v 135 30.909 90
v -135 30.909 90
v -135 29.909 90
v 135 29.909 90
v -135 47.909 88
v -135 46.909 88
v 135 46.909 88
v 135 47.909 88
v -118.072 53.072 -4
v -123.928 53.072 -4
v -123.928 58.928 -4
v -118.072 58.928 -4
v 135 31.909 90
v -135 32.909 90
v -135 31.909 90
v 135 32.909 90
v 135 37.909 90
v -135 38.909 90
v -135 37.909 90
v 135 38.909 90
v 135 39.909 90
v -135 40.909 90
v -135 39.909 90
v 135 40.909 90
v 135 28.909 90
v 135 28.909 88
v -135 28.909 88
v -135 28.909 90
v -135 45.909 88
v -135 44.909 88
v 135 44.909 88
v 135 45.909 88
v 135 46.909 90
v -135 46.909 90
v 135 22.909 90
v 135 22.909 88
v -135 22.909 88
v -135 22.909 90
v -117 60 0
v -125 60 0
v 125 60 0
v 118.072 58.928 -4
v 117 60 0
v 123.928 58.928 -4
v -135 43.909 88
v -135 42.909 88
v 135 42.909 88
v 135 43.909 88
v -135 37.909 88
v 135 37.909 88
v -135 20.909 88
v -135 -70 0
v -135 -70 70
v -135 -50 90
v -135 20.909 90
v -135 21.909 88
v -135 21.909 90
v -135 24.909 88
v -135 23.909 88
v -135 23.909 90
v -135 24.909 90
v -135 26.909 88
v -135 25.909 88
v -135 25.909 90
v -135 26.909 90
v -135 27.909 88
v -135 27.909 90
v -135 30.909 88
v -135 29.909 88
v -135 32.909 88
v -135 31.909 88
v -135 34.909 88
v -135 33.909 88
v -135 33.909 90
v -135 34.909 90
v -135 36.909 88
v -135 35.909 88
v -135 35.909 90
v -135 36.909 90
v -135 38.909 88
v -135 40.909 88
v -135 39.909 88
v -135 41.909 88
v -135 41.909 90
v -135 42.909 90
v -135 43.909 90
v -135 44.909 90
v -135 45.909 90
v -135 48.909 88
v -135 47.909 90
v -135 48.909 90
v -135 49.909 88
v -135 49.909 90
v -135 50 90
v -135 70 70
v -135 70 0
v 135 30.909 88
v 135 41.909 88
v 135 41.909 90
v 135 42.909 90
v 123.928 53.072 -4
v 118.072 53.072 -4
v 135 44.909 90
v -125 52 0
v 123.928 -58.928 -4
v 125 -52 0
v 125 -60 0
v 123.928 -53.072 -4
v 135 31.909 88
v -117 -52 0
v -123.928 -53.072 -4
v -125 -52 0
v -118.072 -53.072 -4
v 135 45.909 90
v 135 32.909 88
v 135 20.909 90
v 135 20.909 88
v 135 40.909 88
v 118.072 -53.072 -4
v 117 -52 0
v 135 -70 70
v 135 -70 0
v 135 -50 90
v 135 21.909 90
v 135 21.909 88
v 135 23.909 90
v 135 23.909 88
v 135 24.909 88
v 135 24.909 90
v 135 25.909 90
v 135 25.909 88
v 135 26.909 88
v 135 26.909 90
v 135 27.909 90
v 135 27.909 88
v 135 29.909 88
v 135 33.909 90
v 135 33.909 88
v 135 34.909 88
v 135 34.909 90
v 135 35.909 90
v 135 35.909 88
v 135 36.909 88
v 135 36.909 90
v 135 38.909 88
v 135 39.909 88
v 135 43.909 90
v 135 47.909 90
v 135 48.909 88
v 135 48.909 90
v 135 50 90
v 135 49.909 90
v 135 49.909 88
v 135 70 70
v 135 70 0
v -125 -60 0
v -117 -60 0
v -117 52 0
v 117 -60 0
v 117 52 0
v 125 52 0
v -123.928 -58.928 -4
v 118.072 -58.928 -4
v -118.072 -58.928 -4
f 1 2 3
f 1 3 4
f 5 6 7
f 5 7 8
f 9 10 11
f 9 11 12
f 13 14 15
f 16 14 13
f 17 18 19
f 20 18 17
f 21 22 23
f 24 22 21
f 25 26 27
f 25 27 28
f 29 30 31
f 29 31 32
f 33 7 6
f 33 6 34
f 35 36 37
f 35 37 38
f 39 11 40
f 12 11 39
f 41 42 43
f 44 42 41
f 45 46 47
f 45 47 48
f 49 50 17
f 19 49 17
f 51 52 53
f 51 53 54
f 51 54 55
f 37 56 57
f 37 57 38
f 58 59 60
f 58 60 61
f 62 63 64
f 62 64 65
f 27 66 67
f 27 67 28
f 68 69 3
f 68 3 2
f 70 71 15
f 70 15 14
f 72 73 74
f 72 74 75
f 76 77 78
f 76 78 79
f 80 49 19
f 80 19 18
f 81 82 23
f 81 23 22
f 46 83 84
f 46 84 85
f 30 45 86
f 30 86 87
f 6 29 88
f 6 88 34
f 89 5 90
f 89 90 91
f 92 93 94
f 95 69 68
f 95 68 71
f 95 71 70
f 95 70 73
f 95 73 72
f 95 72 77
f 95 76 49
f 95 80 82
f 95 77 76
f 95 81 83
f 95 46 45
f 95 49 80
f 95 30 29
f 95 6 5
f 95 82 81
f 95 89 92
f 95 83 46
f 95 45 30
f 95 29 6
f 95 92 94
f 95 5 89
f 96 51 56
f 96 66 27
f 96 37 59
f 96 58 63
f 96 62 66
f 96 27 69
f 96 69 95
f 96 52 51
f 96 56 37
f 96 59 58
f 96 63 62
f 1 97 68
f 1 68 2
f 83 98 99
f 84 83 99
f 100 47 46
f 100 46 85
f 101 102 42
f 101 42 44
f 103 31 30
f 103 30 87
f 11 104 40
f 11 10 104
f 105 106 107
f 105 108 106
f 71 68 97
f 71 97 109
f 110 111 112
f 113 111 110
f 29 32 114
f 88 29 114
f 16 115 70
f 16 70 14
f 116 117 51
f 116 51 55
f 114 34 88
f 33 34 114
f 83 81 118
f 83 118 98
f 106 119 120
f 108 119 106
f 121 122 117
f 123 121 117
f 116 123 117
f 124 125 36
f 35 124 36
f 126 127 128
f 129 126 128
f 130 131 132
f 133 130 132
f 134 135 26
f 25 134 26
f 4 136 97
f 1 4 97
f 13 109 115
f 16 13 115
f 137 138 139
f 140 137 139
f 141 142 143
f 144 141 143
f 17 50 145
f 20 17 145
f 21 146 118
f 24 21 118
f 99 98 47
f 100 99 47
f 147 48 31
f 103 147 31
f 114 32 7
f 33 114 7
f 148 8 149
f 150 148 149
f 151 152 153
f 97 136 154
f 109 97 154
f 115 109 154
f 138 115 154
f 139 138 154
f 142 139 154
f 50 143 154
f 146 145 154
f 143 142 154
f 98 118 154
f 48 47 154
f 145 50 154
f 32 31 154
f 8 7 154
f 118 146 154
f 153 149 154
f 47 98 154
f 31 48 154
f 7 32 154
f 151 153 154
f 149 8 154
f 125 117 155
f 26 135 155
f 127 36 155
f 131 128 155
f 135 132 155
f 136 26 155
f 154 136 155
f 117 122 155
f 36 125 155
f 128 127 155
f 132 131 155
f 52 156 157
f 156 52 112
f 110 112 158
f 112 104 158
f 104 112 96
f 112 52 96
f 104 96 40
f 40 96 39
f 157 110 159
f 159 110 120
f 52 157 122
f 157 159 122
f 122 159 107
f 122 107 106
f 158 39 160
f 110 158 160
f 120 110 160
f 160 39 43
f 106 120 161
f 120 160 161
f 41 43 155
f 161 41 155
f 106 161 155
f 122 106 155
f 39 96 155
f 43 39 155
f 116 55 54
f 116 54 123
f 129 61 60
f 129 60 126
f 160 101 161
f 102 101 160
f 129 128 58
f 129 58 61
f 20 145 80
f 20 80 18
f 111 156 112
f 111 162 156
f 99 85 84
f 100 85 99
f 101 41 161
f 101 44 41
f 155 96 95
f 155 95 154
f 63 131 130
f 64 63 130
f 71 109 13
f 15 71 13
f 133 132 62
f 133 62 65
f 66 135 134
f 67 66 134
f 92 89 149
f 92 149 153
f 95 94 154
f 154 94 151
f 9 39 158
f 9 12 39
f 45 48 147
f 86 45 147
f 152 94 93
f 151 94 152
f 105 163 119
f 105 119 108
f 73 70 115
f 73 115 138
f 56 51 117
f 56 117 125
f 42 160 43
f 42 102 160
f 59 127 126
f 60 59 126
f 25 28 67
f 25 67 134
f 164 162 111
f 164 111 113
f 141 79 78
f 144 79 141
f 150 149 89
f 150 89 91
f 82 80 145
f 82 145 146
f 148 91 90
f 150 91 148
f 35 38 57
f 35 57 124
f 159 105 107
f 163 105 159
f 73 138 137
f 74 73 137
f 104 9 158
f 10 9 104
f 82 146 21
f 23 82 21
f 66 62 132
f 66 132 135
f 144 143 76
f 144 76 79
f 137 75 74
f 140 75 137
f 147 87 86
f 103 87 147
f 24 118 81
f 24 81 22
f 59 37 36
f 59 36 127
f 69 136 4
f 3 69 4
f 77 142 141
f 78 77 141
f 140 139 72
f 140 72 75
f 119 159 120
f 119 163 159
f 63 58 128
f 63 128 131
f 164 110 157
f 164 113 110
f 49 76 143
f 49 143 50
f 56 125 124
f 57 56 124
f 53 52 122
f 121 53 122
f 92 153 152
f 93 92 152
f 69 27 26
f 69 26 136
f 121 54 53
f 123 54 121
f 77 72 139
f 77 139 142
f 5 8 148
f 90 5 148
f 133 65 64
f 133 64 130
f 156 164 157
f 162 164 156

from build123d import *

# Parameters (mm, degrees)
F0_W     = 270
F0_H     = 140
F1_DEPTH = 90
F2_SIZE  = 20
F3_W     = 1
F3_H     = 2
F4_DEPTH = 270
F5_W     = 8
F5_H     = 8
F6_DEPTH = 4
F6_TAPER = 15


with BuildPart() as f1:
    # F0 (on Top) → F1 (new body)
    with BuildSketch(Plane.XY):
        Rectangle(F0_W, F0_H)
    extrude(amount=F1_DEPTH)

    # F2
    f2_edges = [f1.edges().sort_by_distance(p)[0] for p in [
        (0, -70, 90),
        (0, 70, 90),
    ]]
    chamfer(f2_edges, length=F2_SIZE)

    # F3 (on face) → F4 (cut, through all)
    with BuildSketch(Plane.YZ.offset(135)):
        with Locations((21.4087878466, 89)):
            Rectangle(F3_W, F3_H)
        with Locations((23.4087878466, 89)):
            Rectangle(F3_W, F3_H)
        with Locations((25.4087878466, 89)):
            Rectangle(F3_W, F3_H)
        with Locations((27.4087878466, 89)):
            Rectangle(F3_W, F3_H)
        with Locations((29.4087878466, 89)):
            Rectangle(F3_W, F3_H)
        with Locations((31.4087878466, 89)):
            Rectangle(F3_W, F3_H)
        with Locations((33.4087878466, 89)):
            Rectangle(F3_W, F3_H)
        with Locations((35.4087878466, 89)):
            Rectangle(F3_W, F3_H)
        with Locations((37.4087878466, 89)):
            Rectangle(F3_W, F3_H)
        with Locations((39.4087878466, 89)):
            Rectangle(F3_W, F3_H)
        with Locations((41.4087878466, 89)):
            Rectangle(F3_W, F3_H)
        with Locations((43.4087878466, 89)):
            Rectangle(F3_W, F3_H)
        with Locations((45.4087878466, 89)):
            Rectangle(F3_W, F3_H)
        with Locations((47.4087878466, 89)):
            Rectangle(F3_W, F3_H)
        with Locations((49.4087878466, 89)):
            Rectangle(F3_W, F3_H)
    extrude(amount=-F4_DEPTH, mode=Mode.SUBTRACT)

    # F5 (on face) → F6 (join)
    with BuildSketch(Plane(origin=(0, 0, 0), x_dir=(1, 0, 0), z_dir=(0, 0, -1))):
        with Locations((121, 56)):
            Rectangle(F5_W, F5_H)
        with Locations((121, -56)):
            Rectangle(F5_W, F5_H)
        with Locations((-121, 56)):
            Rectangle(F5_W, F5_H)
        with Locations((-121, -56)):
            Rectangle(F5_W, F5_H)
    extrude(amount=F6_DEPTH, taper=F6_TAPER)


solid = f1.part
